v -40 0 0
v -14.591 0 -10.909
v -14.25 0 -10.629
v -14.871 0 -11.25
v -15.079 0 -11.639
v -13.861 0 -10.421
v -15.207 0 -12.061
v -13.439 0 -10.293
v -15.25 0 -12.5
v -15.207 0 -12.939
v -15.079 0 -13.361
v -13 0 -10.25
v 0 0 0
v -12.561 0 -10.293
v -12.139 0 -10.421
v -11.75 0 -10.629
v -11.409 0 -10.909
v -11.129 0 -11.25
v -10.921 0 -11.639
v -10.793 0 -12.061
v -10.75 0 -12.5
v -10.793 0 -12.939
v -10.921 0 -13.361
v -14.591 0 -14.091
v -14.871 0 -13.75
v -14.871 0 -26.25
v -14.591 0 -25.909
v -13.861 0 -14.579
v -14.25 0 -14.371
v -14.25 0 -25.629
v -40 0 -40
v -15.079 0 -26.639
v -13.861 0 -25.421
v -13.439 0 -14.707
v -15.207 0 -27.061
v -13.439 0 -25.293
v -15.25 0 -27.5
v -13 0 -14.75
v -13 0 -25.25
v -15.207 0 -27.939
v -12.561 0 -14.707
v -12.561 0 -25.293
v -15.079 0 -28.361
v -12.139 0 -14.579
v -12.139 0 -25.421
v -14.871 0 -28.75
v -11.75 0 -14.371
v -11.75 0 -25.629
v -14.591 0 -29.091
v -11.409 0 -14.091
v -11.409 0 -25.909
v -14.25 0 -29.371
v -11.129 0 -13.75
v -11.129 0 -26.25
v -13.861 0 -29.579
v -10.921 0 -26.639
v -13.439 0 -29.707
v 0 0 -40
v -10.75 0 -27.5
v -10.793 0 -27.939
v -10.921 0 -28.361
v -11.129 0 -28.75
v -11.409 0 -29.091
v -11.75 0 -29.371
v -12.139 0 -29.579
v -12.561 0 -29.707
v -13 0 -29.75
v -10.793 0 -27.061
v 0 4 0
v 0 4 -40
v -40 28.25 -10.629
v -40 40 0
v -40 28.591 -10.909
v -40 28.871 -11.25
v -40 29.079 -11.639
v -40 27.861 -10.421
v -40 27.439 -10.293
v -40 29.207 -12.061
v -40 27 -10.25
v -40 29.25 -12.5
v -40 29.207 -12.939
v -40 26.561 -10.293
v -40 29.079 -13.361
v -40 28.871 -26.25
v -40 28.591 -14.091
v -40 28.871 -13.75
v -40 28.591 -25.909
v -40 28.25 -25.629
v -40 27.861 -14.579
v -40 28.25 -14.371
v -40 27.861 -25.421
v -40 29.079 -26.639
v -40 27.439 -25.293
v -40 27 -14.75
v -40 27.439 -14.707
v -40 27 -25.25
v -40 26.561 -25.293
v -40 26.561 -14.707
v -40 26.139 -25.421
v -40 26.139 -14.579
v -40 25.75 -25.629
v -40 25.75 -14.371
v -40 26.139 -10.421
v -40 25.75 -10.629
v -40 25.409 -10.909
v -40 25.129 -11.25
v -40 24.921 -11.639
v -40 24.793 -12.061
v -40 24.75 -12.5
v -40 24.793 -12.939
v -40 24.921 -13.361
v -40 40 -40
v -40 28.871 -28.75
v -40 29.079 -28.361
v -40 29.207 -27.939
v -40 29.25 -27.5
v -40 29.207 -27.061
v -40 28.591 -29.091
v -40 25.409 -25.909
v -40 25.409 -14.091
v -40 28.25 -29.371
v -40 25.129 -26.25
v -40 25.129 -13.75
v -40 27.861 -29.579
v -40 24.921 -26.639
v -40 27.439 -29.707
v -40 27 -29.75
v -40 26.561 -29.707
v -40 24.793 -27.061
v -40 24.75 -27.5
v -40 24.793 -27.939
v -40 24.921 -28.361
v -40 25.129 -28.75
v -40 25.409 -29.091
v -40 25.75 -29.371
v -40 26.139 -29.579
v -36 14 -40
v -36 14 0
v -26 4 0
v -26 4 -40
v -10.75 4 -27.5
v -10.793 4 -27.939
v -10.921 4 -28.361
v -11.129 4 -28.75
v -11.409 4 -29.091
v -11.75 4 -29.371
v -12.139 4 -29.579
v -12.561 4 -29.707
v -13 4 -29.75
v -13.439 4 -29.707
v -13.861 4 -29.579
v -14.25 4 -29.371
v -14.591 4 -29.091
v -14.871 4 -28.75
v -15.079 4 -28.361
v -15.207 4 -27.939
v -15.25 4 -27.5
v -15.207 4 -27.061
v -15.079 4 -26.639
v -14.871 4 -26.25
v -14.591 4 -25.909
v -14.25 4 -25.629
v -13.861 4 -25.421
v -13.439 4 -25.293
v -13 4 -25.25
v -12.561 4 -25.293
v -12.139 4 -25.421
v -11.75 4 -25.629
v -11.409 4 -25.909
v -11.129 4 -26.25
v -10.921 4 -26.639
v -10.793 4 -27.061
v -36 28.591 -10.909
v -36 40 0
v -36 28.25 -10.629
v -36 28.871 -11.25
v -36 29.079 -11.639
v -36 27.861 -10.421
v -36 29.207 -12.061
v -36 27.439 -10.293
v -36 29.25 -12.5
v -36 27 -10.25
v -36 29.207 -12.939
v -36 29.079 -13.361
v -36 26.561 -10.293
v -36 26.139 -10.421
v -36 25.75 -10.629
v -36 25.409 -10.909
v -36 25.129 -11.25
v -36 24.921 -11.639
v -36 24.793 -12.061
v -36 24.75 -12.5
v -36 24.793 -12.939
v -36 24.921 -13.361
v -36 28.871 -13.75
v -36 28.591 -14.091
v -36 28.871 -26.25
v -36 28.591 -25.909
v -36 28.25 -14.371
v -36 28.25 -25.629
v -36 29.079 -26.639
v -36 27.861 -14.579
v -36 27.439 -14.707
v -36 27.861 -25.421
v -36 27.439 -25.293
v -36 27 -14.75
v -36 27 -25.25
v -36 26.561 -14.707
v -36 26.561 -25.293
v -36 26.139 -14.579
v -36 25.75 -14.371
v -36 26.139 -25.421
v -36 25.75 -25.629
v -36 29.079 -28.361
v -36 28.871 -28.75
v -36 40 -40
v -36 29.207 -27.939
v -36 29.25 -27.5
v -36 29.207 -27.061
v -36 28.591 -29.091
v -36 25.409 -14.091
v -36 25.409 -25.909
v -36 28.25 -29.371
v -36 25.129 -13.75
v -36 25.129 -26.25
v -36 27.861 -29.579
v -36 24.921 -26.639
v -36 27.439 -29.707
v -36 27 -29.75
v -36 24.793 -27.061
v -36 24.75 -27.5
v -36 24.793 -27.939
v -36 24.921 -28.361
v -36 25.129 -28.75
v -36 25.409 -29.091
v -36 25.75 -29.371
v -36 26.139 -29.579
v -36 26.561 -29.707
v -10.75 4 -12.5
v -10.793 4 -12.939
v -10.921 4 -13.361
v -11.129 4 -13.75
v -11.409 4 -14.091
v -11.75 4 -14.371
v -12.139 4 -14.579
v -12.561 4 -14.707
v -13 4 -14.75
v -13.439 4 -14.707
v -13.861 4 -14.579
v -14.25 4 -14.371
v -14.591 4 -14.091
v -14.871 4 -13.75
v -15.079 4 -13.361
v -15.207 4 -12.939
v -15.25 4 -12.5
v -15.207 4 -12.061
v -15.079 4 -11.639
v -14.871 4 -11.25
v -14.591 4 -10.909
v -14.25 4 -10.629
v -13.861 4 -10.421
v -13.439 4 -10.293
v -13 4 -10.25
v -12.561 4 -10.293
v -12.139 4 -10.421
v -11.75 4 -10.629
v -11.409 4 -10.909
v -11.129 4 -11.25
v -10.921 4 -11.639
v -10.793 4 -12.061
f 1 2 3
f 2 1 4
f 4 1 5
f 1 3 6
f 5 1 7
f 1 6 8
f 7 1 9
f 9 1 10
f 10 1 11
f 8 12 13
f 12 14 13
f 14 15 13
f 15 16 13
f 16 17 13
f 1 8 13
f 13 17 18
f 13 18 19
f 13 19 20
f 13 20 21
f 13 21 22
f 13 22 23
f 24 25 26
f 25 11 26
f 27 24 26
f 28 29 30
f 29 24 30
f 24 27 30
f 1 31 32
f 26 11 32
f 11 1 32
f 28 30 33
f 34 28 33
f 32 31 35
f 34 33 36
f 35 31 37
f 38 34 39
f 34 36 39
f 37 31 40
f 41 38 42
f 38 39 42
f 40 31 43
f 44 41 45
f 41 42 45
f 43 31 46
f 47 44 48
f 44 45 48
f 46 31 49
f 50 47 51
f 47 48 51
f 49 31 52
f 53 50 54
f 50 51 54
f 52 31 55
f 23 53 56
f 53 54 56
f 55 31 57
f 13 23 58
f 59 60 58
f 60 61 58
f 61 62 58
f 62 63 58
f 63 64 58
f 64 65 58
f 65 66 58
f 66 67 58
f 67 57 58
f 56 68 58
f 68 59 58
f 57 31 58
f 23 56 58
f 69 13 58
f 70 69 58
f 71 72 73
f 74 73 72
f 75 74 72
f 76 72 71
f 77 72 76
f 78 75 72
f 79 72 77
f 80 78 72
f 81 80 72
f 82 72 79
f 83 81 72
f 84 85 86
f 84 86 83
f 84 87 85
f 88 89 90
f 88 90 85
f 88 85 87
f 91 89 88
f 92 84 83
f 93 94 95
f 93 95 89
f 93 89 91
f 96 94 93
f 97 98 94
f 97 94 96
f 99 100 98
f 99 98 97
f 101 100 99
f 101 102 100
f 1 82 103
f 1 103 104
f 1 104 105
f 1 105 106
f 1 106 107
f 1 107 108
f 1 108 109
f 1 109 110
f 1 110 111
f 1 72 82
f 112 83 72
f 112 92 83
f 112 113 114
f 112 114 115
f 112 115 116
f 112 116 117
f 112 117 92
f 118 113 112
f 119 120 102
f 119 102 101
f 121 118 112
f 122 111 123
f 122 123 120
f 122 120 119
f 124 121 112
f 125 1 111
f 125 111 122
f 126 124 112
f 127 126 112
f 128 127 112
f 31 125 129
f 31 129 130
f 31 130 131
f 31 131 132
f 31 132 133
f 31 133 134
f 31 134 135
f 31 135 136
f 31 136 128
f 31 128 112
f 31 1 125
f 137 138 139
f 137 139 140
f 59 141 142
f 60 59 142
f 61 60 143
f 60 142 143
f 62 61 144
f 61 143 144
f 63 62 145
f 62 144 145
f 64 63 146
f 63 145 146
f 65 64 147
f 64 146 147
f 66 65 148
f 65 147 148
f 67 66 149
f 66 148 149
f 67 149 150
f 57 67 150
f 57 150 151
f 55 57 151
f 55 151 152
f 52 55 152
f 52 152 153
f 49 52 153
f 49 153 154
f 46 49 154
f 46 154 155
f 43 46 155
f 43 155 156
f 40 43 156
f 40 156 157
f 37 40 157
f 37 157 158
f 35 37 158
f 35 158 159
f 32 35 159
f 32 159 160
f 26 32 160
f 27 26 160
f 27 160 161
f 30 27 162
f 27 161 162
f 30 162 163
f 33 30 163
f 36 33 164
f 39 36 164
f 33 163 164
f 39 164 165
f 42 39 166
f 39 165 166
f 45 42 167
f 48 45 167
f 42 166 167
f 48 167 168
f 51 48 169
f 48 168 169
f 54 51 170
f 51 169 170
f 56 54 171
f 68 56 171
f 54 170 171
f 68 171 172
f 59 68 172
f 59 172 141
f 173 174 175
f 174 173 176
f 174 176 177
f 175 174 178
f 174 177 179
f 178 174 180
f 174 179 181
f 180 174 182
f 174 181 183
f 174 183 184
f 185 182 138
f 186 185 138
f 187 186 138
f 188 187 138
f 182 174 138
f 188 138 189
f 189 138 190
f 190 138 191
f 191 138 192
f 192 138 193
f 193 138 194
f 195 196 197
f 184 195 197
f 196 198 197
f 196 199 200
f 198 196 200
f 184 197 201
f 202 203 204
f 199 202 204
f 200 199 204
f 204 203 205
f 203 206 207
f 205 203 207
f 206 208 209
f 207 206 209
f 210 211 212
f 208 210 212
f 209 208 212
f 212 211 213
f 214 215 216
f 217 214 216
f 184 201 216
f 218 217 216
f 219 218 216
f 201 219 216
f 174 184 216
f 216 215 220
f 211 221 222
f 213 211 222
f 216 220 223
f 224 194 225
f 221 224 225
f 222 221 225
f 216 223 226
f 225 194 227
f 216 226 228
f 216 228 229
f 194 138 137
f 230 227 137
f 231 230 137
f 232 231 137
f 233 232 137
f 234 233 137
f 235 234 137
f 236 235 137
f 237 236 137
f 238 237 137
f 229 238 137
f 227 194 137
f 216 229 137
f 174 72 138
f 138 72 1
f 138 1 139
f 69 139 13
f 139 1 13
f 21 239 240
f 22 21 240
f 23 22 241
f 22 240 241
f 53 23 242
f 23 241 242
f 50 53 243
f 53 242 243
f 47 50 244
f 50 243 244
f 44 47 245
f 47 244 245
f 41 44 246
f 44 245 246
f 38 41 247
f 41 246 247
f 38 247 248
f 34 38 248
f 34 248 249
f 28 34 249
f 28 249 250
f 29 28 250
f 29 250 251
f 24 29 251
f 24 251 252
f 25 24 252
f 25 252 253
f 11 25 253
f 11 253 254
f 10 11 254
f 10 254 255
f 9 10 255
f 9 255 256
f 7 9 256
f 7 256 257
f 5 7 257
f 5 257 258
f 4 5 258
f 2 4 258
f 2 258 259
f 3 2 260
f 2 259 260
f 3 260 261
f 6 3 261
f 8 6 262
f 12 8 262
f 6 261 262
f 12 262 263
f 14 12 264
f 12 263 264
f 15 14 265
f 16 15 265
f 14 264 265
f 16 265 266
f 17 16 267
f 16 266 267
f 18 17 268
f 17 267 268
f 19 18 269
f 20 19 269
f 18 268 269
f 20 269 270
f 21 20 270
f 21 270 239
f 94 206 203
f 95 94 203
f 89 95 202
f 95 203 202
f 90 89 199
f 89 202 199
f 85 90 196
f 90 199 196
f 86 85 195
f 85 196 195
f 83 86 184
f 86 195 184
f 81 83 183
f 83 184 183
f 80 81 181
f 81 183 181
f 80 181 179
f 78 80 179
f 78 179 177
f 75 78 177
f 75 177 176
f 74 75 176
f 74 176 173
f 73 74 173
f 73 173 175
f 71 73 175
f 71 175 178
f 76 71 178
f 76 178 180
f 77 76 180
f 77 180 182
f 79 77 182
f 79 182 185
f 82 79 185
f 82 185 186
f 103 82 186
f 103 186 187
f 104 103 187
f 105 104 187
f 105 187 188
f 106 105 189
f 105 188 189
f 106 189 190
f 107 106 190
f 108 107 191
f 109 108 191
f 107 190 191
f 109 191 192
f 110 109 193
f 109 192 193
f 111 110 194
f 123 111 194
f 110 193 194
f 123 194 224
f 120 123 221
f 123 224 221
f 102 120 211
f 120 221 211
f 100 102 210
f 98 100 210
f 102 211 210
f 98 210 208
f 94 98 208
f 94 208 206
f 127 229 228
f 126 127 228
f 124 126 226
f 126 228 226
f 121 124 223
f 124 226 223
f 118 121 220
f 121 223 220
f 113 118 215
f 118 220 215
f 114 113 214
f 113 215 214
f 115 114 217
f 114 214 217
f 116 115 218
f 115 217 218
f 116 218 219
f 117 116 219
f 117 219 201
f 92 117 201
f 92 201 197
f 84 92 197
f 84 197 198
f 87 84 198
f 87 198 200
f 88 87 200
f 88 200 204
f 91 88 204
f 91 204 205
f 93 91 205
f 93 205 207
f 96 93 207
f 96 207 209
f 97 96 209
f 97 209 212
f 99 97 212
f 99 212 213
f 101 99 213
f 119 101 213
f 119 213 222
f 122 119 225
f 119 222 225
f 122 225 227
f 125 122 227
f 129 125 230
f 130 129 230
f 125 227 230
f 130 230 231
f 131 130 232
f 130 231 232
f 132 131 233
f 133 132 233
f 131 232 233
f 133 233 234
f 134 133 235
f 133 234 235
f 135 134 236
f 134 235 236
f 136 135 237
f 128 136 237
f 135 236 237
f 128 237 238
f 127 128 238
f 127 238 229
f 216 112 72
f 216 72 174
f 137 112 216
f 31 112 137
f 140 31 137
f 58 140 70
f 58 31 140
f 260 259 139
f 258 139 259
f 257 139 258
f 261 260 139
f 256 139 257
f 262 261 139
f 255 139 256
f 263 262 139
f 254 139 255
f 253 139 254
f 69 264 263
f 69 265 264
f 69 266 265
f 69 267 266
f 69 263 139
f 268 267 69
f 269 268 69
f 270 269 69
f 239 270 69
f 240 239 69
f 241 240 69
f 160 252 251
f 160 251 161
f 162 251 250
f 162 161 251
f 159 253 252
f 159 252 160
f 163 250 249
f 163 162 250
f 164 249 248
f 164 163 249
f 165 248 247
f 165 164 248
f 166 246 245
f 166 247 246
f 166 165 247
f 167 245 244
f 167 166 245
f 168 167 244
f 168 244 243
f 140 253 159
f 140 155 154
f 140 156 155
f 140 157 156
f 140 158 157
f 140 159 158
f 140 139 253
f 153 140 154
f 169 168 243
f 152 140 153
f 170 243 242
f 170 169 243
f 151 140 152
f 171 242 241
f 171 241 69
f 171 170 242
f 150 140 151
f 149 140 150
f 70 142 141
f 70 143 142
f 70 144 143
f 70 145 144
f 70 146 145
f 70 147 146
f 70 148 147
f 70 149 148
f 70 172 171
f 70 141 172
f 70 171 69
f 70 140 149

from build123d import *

# Parameters (mm, degrees)
SCHIZZO1_W                   = 40
SCHIZZO1_H                   = 40
ESTRUSIONE_ESTRUSIONE1_DEPTH = 4
SCHIZZO2_W                   = 4
SCHIZZO2_H                   = 40
ESTRUSIONE_ESTRUSIONE2_DEPTH = 36
SMUSSO1_SIZE                 = 10
FORO_PER_VITE_M4_1_D         = 4.5
FORO_PER_VITE_M4_1_DEPTH     = 9
FORO_PER_VITE_M4_1_TIP       = 1.351936393
FORO_PER_VITE_M4_3_D         = 4.5
FORO_PER_VITE_M4_3_DEPTH     = 9
FORO_PER_VITE_M4_3_TIP       = 1.351936393


with BuildPart() as part:
    # Schizzo1 → Estrusione-Estrusione1 (new body)
    with BuildSketch(Plane(origin=(0, 0, 0), x_dir=(1, 0, 0), z_dir=(0, 1, 0))):
        with Locations((-20, 20)):
            Rectangle(SCHIZZO1_W, SCHIZZO1_H)
    extrude(amount=ESTRUSIONE_ESTRUSIONE1_DEPTH)

    # Schizzo2 → Estrusione-Estrusione2 (add)
    with BuildSketch(Plane(origin=(0, 4, 0), x_dir=(1, 0, 0), z_dir=(0, 1, 0))):
        with Locations((-38, 20)):
            Rectangle(SCHIZZO2_W, SCHIZZO2_H)
    extrude(amount=ESTRUSIONE_ESTRUSIONE2_DEPTH)

    # Smusso1
    smusso1_edges = [part.edges().sort_by_distance(p)[0] for p in [
        (-36, 4, -20),
    ]]
    chamfer(smusso1_edges, length=SMUSSO1_SIZE)

    # Foro per Vite M4-1
    with Locations(Plane(origin=(0, 0, 0), x_dir=(-1, 0, 0), z_dir=(0, -1, 0))):
        with Locations((13, 27.5), (13, 12.5)):
            Hole(FORO_PER_VITE_M4_1_D / 2, depth=FORO_PER_VITE_M4_1_DEPTH)
            with Locations((0, 0, -(FORO_PER_VITE_M4_1_DEPTH + FORO_PER_VITE_M4_1_TIP / 2))):  # 118° drill point
                Cone(0, FORO_PER_VITE_M4_1_D / 2, FORO_PER_VITE_M4_1_TIP, mode=Mode.SUBTRACT)

    # Foro per Vite M4-3
    with Locations(Plane.ZY.offset(40)):
        with Locations((-27.5, 27), (-12.5, 27)):
            Hole(FORO_PER_VITE_M4_3_D / 2, depth=FORO_PER_VITE_M4_3_DEPTH)
            with Locations((0, 0, -(FORO_PER_VITE_M4_3_DEPTH + FORO_PER_VITE_M4_3_TIP / 2))):  # 118° drill point
                Cone(0, FORO_PER_VITE_M4_3_D / 2, FORO_PER_VITE_M4_3_TIP, mode=Mode.SUBTRACT)


solid = part.part
